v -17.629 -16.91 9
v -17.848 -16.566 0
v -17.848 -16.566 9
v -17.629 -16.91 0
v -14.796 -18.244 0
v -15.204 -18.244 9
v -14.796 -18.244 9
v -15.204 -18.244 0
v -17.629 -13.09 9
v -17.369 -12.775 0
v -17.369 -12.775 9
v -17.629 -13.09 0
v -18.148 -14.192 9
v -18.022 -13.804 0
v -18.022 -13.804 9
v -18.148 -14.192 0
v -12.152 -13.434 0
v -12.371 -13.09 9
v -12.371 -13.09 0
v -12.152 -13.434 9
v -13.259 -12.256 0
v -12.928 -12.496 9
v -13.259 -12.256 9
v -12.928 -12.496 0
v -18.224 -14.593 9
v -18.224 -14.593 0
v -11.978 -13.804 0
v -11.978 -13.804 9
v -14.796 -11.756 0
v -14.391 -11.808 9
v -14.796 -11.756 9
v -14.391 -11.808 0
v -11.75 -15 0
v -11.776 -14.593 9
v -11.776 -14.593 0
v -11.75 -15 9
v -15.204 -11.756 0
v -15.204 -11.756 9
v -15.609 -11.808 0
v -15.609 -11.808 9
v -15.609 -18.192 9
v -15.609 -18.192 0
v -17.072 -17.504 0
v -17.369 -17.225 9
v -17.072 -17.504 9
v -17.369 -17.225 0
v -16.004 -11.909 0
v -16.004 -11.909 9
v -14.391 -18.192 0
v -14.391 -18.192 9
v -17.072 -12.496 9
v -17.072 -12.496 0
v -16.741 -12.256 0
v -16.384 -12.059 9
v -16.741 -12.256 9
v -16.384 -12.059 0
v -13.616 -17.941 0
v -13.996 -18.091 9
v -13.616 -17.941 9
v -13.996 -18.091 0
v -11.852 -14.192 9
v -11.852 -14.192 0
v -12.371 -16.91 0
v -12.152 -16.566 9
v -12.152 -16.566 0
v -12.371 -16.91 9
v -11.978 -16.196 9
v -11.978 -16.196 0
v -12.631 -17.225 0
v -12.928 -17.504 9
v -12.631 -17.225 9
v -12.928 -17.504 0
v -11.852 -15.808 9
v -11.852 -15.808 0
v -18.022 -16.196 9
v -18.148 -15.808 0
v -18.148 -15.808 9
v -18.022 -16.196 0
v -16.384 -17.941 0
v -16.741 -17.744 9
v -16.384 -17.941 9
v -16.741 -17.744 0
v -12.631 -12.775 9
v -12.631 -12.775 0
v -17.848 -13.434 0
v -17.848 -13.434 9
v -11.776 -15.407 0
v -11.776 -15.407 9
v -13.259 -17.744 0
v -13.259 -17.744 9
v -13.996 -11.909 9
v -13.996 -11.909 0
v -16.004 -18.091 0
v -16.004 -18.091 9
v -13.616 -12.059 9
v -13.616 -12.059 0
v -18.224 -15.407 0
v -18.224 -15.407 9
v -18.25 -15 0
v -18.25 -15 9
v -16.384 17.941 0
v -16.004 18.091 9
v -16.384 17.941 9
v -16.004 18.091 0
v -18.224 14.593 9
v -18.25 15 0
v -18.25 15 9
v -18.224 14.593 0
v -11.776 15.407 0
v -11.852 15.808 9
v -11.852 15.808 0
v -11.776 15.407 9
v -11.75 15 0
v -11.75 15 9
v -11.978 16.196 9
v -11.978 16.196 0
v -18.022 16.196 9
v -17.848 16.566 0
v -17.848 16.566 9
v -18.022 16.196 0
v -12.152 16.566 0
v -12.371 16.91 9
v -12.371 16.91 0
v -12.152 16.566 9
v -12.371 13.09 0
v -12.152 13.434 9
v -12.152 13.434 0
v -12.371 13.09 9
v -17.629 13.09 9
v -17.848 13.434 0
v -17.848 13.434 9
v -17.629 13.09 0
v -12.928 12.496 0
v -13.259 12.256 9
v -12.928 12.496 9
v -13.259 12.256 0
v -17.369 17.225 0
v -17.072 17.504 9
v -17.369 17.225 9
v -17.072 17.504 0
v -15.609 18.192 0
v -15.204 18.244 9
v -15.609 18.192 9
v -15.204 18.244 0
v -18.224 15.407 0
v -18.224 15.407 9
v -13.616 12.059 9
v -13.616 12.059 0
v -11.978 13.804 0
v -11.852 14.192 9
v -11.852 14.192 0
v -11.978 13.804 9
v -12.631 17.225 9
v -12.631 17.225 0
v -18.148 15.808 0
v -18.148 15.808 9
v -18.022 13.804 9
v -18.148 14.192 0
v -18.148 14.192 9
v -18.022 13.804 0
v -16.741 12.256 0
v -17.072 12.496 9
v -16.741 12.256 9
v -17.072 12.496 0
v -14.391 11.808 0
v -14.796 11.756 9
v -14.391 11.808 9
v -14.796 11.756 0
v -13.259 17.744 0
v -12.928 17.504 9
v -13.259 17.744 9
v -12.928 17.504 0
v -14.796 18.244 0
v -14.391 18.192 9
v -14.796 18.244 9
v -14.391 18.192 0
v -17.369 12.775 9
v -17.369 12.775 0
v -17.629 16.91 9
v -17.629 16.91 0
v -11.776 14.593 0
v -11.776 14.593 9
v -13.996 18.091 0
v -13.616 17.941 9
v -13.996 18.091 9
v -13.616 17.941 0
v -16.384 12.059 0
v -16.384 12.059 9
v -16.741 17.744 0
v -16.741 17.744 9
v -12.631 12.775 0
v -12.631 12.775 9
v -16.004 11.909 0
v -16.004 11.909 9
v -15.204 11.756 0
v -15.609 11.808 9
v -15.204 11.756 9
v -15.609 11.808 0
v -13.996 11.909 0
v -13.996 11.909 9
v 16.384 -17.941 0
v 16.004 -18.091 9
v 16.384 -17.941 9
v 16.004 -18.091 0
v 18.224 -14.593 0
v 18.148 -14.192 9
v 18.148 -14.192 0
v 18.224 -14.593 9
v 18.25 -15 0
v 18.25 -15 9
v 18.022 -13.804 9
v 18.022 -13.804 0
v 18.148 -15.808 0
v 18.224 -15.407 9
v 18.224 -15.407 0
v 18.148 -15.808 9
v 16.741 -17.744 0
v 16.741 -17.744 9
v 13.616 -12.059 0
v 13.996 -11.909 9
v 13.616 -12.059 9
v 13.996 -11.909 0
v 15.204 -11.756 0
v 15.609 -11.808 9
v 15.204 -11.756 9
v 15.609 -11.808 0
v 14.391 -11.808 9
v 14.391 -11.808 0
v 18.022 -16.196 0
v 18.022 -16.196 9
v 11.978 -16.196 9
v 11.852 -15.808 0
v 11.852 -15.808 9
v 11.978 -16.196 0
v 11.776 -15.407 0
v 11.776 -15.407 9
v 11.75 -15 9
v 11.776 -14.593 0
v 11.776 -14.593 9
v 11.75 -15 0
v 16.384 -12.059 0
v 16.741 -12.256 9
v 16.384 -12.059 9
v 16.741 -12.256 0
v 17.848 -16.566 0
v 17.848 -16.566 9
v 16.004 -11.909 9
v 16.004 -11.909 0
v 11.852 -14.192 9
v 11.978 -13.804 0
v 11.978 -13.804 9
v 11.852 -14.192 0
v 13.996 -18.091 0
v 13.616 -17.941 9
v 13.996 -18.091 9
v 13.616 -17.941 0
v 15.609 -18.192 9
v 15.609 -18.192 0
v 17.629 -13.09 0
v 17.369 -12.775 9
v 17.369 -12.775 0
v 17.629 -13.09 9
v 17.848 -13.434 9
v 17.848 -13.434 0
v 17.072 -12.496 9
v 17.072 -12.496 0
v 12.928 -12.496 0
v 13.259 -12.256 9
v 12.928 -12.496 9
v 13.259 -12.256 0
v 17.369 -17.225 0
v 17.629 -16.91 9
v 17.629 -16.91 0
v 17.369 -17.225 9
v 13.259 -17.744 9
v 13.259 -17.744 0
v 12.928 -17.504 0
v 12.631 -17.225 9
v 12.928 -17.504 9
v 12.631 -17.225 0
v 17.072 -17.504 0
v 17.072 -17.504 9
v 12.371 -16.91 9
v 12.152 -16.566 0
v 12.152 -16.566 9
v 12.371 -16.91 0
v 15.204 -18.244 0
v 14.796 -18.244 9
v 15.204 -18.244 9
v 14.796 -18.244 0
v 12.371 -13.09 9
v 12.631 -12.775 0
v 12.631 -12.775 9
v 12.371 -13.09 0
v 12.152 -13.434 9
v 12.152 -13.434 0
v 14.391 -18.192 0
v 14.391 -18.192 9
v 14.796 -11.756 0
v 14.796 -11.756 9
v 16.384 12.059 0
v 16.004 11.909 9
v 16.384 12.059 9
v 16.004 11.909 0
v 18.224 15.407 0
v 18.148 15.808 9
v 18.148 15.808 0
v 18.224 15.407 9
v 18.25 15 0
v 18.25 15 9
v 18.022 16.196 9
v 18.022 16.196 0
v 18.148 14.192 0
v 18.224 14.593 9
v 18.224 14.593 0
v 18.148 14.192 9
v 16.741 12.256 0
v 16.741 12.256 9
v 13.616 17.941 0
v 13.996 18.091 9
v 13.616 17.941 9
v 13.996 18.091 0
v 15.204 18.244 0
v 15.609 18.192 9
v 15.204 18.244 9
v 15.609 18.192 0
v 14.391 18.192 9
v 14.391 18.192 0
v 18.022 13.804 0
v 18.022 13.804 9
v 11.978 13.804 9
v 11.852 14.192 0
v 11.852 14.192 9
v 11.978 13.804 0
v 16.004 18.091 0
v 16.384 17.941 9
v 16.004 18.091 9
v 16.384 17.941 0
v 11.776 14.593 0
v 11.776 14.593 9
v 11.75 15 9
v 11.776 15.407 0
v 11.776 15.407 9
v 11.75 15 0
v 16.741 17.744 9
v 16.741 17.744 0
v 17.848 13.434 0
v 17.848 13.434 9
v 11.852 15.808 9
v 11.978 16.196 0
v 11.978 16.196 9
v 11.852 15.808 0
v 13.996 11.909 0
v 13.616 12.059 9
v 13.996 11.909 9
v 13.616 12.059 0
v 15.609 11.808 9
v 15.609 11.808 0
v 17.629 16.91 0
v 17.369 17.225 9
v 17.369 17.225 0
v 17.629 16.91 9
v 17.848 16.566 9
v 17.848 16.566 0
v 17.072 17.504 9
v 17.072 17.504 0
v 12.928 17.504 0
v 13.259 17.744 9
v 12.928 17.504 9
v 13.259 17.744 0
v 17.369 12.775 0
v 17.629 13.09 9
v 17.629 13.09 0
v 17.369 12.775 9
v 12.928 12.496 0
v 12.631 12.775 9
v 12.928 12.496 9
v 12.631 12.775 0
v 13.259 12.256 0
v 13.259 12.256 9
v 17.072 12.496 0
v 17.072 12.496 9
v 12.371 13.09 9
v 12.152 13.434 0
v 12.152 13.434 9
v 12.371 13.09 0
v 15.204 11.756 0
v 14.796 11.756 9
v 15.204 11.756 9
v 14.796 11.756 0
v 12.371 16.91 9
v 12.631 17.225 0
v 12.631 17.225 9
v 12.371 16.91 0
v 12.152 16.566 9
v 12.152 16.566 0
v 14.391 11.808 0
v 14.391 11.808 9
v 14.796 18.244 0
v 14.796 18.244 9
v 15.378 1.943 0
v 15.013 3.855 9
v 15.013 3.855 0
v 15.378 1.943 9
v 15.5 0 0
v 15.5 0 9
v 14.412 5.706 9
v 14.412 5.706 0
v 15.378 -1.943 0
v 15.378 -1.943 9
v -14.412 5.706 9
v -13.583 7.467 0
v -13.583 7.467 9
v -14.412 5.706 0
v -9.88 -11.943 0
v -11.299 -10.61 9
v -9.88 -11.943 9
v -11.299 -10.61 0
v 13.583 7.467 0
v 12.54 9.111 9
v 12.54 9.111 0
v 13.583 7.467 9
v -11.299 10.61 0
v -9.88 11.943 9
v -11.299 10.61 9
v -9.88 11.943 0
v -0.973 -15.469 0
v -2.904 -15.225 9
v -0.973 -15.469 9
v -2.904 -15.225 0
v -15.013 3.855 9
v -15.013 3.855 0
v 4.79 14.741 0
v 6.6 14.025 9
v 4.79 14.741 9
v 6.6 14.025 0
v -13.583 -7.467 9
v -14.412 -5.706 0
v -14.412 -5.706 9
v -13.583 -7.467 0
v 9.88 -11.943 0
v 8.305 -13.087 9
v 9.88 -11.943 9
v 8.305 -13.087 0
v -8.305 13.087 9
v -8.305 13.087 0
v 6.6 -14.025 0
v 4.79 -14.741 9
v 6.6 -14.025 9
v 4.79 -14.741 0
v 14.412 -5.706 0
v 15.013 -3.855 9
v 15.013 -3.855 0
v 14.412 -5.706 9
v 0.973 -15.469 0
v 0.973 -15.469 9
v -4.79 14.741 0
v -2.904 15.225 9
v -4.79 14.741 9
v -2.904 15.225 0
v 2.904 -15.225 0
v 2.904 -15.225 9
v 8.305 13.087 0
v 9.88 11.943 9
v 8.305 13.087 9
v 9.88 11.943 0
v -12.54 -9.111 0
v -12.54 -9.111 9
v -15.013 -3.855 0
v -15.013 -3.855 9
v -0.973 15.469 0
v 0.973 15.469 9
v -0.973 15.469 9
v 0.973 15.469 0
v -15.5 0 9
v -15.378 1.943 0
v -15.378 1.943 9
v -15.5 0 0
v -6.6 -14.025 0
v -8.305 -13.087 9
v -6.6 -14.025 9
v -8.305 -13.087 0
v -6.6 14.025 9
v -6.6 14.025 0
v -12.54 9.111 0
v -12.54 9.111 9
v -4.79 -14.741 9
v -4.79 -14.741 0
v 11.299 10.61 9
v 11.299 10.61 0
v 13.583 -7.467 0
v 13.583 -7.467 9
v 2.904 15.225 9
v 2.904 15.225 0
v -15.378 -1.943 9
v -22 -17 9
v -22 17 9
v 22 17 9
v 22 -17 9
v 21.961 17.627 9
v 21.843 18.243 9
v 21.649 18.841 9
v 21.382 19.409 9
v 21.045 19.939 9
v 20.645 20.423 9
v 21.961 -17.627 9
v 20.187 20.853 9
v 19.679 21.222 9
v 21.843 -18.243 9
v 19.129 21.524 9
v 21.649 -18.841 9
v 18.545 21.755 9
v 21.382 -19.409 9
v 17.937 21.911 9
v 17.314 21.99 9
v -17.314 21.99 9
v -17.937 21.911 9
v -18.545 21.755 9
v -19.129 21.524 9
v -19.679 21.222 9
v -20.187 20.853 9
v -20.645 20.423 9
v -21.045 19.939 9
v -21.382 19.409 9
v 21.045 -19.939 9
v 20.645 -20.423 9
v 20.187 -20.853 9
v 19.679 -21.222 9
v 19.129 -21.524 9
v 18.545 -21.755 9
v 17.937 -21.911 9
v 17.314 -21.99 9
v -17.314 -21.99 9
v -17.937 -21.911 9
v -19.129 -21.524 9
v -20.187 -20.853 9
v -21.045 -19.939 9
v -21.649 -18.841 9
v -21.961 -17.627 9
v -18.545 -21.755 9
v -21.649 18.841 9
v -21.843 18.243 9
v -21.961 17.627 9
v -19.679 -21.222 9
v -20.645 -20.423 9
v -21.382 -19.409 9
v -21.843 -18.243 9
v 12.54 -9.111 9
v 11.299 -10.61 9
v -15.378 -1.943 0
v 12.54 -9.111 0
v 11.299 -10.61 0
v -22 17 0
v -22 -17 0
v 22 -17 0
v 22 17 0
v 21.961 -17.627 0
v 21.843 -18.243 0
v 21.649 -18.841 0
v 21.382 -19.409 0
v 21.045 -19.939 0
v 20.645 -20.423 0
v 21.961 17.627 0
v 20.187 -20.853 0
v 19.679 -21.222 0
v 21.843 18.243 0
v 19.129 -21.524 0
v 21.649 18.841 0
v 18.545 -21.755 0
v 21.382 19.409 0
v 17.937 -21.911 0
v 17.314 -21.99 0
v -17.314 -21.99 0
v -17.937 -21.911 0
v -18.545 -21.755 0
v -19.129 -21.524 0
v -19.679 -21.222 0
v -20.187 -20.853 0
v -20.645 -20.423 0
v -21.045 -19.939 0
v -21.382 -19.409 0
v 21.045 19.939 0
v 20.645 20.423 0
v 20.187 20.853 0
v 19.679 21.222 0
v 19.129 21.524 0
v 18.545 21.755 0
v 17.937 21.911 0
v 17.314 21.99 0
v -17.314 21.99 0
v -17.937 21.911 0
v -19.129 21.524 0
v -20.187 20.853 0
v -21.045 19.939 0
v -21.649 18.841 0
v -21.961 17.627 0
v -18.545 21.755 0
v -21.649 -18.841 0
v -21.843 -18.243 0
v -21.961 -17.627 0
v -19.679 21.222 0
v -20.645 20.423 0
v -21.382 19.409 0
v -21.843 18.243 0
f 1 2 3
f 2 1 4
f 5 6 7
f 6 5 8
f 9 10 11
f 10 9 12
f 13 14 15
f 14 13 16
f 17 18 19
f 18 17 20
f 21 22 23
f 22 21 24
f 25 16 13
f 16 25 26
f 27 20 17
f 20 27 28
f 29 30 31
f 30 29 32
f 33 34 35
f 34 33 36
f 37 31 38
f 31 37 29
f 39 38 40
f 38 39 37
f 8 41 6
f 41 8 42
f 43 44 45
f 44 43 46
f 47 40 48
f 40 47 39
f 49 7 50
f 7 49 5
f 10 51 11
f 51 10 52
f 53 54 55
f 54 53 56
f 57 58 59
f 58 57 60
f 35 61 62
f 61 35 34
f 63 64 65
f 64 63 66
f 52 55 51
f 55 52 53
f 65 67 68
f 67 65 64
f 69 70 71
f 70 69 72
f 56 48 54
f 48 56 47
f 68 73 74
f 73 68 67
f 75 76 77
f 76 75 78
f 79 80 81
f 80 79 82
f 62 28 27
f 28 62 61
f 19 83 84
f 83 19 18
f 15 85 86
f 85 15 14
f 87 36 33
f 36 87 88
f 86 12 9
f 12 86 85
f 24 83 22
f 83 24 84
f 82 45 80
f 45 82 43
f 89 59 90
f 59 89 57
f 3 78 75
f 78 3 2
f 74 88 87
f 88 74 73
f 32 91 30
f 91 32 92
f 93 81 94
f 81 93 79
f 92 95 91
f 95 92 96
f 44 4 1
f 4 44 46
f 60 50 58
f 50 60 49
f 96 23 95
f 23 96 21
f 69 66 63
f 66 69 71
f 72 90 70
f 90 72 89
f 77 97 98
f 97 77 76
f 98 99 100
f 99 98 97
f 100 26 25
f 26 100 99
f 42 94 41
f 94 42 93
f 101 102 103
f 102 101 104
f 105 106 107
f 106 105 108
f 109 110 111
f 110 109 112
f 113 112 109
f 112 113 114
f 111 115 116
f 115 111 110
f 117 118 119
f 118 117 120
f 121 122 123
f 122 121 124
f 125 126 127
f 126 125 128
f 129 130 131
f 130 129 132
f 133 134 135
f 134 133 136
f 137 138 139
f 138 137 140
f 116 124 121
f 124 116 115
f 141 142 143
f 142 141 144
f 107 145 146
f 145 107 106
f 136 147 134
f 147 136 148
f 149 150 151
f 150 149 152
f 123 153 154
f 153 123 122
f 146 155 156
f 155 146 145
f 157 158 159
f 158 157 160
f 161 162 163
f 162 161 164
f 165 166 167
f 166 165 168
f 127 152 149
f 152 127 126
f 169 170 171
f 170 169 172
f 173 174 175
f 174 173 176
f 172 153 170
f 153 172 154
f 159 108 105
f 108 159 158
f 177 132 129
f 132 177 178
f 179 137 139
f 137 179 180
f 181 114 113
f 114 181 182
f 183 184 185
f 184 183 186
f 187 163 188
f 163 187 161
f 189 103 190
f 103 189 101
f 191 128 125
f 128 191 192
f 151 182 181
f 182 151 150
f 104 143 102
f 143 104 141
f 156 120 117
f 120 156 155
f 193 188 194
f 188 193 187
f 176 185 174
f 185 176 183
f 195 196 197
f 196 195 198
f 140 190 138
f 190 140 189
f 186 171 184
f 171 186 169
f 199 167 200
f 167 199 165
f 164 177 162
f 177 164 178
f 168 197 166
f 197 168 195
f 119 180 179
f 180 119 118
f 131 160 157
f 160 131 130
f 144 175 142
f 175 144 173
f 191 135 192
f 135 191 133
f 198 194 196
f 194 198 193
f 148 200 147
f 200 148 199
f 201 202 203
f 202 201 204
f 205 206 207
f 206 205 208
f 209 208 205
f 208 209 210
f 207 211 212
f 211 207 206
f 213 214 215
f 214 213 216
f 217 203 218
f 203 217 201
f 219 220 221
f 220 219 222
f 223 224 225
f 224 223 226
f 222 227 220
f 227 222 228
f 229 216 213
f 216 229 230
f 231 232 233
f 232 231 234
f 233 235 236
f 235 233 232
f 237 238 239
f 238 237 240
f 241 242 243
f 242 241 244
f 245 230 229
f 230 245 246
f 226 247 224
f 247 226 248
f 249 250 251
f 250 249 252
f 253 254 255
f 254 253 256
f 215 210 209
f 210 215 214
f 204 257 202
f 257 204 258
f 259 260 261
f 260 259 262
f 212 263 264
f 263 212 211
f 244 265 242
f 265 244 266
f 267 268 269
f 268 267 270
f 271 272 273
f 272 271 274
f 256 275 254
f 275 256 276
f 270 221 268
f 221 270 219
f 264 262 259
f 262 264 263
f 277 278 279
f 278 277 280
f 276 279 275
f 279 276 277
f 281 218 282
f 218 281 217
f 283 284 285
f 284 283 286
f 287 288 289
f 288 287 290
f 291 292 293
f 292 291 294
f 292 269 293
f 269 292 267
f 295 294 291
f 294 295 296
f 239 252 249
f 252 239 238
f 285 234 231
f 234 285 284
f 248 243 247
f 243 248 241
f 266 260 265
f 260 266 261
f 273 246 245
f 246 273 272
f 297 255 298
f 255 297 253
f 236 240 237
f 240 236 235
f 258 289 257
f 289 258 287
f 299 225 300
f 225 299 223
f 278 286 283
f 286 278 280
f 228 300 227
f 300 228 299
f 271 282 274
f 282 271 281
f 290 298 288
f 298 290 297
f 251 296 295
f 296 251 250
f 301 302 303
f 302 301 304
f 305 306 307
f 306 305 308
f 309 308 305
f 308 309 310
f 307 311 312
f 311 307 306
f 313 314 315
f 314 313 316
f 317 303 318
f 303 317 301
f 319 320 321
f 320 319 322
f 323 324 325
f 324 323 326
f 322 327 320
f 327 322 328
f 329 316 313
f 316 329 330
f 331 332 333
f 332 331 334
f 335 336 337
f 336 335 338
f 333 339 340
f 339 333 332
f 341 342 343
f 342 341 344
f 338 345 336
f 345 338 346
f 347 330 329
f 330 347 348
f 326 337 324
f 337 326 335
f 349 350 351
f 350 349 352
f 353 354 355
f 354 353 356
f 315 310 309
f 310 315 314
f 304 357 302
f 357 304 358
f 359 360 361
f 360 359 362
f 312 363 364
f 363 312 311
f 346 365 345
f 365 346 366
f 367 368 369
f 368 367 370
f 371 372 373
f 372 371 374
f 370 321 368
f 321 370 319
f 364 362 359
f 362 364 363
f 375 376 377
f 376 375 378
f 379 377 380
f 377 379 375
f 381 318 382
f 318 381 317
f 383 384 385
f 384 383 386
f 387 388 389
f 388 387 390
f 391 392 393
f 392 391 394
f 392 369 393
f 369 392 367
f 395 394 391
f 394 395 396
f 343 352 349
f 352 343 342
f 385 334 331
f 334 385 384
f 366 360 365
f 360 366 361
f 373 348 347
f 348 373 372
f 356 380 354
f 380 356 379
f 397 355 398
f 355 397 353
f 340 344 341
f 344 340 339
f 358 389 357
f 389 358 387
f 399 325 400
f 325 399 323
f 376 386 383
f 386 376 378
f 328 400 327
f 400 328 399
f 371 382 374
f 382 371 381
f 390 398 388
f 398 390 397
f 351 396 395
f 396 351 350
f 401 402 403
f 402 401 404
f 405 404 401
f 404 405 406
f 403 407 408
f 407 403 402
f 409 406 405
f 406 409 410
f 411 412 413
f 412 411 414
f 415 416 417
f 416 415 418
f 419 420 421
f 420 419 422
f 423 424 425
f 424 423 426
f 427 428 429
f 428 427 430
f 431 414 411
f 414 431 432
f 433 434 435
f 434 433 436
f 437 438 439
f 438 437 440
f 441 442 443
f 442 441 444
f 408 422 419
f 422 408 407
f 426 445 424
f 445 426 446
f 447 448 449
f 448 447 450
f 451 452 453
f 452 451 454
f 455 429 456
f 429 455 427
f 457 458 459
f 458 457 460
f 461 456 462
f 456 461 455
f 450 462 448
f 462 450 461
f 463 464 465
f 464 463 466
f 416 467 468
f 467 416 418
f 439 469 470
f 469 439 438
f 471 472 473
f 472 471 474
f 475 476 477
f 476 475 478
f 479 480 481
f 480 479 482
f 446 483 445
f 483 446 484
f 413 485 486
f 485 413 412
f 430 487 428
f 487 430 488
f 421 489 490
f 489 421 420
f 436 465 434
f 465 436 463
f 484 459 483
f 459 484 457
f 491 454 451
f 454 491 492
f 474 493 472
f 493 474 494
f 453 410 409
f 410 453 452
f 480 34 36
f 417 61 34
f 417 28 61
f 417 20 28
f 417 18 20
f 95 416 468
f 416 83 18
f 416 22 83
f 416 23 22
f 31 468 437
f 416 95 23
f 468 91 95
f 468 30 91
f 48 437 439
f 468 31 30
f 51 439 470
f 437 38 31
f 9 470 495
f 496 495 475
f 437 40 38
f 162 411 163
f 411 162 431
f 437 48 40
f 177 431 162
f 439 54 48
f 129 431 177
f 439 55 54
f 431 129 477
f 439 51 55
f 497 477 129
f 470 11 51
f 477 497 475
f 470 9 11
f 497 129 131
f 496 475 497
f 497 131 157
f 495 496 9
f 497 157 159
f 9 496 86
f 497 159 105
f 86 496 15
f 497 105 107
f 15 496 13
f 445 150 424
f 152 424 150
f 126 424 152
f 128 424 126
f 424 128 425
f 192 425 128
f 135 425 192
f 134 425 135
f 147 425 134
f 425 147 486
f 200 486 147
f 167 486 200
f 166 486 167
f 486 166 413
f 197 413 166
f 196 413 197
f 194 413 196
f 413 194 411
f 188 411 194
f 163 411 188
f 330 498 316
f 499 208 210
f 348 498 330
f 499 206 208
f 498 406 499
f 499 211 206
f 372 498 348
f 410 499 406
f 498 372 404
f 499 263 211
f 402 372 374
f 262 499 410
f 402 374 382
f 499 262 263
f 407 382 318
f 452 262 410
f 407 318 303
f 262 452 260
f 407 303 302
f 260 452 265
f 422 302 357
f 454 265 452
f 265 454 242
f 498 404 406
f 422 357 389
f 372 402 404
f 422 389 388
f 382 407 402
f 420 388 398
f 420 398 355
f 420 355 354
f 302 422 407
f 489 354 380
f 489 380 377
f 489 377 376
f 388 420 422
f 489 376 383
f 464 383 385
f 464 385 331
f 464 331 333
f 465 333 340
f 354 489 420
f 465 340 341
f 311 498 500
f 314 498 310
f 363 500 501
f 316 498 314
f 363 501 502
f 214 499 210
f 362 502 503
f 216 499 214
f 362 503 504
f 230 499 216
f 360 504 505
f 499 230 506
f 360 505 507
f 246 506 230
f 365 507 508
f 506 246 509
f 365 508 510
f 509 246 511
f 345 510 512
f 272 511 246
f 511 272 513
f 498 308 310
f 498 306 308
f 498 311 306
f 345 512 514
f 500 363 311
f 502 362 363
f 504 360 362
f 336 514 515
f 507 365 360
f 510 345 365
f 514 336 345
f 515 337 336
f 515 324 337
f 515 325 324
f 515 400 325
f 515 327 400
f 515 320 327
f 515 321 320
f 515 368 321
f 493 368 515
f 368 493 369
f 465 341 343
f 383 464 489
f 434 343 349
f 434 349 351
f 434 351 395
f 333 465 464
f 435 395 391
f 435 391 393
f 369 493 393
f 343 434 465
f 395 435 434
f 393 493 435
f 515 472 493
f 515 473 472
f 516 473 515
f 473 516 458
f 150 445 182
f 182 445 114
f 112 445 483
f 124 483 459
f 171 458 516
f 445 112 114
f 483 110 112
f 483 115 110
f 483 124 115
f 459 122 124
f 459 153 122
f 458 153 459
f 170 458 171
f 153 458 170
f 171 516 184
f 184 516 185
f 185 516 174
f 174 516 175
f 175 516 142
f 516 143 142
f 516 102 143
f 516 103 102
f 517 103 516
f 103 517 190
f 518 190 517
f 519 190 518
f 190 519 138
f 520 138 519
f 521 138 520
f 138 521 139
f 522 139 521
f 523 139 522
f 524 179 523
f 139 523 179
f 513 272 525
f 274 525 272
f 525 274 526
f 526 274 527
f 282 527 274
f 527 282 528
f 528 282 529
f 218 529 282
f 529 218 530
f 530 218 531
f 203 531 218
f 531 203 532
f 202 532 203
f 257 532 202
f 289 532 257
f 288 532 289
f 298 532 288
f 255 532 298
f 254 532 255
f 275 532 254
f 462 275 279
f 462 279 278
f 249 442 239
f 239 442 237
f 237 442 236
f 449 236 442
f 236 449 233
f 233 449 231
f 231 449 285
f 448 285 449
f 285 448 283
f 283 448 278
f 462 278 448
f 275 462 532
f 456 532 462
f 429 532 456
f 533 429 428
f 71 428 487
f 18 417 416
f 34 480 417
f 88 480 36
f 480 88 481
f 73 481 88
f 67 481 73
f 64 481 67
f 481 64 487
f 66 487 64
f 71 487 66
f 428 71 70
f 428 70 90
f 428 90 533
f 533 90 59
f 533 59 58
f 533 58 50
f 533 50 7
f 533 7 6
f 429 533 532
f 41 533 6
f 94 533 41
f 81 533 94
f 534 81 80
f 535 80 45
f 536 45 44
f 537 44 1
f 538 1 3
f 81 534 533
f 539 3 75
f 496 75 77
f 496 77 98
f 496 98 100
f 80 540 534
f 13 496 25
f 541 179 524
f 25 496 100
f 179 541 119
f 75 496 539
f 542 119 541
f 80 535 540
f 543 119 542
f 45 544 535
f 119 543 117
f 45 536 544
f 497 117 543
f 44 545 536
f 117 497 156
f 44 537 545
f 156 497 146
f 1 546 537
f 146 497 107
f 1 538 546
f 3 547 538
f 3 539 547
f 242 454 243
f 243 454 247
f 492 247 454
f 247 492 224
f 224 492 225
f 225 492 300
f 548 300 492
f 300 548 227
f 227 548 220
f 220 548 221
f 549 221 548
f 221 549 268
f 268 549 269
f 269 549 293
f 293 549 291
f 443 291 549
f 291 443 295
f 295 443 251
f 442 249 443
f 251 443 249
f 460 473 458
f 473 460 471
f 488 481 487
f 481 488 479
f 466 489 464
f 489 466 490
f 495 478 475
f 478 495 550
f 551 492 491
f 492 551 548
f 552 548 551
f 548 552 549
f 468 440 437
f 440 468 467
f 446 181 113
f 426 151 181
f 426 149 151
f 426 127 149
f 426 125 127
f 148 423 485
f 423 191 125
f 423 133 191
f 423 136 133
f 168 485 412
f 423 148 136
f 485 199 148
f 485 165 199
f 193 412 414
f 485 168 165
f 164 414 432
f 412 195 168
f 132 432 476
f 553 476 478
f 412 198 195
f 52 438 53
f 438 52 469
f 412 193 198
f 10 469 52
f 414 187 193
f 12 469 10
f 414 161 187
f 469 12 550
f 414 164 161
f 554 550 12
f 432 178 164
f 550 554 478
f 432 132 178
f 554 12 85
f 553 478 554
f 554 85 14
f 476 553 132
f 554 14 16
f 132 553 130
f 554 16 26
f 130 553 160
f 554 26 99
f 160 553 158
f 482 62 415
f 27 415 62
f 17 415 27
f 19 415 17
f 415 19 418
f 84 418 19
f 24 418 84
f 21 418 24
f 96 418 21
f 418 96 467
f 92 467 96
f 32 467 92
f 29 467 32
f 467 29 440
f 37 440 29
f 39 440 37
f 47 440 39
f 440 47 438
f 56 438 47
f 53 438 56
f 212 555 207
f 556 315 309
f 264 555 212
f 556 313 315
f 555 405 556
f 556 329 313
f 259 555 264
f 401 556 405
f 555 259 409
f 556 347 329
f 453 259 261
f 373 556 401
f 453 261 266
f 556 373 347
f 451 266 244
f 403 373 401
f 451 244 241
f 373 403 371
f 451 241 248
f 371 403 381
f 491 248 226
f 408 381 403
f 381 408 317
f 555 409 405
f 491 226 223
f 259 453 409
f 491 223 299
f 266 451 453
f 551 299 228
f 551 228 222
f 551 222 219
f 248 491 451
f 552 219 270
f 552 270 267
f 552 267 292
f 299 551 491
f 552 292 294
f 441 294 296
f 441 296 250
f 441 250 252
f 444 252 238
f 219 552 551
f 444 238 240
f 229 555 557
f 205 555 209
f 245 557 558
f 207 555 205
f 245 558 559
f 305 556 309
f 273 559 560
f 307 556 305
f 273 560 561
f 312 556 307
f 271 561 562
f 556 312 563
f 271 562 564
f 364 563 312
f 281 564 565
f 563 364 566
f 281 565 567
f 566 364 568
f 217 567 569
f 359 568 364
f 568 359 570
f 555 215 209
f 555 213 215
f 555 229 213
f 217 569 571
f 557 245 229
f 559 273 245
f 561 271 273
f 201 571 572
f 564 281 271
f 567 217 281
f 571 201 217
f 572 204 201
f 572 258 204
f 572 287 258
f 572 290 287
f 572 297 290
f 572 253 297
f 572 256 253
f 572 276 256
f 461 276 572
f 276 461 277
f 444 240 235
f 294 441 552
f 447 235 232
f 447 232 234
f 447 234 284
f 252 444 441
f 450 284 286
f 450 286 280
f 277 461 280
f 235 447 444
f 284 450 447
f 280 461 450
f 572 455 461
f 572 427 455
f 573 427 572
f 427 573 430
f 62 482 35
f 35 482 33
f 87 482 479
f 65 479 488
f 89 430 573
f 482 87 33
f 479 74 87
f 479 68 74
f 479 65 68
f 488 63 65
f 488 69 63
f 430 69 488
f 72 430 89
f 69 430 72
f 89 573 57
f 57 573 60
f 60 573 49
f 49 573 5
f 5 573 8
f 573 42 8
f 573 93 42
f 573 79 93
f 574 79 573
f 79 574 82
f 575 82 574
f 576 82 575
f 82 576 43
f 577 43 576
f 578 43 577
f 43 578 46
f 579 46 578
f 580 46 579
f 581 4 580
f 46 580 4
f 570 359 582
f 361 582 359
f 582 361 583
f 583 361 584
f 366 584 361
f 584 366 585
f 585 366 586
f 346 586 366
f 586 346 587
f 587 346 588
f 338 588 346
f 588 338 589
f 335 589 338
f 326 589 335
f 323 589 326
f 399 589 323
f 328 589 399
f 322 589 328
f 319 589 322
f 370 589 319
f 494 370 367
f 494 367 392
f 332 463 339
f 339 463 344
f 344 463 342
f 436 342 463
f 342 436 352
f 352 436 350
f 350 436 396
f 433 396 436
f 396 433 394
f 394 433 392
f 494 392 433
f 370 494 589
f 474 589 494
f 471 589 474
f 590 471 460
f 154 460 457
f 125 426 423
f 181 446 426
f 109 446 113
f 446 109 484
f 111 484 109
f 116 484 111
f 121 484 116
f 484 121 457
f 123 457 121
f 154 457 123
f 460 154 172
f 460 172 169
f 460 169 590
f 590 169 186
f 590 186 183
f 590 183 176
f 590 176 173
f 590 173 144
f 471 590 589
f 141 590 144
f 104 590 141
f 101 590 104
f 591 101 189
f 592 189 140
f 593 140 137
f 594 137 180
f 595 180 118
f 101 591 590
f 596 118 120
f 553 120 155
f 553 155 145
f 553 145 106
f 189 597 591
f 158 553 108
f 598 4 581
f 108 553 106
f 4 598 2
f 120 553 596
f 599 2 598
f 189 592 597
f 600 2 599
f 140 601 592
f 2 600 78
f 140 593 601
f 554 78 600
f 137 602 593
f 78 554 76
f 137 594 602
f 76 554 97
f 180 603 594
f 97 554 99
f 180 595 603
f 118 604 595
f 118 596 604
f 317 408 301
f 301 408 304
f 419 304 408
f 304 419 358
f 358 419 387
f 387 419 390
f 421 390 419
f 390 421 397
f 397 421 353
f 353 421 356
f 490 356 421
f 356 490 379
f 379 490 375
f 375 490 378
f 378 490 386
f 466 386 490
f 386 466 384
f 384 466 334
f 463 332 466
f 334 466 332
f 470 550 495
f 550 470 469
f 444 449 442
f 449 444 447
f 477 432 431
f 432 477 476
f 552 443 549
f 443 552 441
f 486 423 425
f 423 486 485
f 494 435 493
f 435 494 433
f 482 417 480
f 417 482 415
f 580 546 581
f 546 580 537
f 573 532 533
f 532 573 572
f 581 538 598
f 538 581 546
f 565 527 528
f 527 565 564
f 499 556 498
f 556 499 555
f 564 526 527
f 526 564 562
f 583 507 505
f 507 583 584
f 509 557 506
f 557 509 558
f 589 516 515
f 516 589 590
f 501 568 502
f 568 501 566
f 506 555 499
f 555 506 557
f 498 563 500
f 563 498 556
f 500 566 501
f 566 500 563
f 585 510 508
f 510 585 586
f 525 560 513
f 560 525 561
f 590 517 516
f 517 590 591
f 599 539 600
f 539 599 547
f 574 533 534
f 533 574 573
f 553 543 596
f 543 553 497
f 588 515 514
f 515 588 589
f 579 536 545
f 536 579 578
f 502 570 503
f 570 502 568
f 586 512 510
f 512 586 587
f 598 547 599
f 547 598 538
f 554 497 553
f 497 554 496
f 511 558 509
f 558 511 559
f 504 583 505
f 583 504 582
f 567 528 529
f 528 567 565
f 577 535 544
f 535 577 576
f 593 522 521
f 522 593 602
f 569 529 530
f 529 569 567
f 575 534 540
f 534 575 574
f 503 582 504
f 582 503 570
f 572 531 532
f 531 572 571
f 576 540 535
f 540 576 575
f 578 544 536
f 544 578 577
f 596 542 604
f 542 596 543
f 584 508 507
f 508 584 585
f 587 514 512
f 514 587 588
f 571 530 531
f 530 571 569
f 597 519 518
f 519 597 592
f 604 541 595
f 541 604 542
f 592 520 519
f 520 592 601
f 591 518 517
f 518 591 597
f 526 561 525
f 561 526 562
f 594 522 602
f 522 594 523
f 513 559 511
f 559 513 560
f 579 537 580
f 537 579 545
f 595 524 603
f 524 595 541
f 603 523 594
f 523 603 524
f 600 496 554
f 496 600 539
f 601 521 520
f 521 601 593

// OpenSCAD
$fn = 50;


difference() {
	union() {
		hull() {
			translate(v = [-17.0000000000, 17.0000000000, 0]) {
				cylinder(h = 9, r = 5);
			}
			translate(v = [17.0000000000, 17.0000000000, 0]) {
				cylinder(h = 9, r = 5);
			}
			translate(v = [-17.0000000000, -17.0000000000, 0]) {
				cylinder(h = 9, r = 5);
			}
			translate(v = [17.0000000000, -17.0000000000, 0]) {
				cylinder(h = 9, r = 5);
			}
		}
	}
	union() {
		#translate(v = [-15.0000000000, -15.0000000000, -100.0000000000]) {
			cylinder(h = 200, r = 3.2500000000);
		}
		#translate(v = [-15.0000000000, 15.0000000000, -100.0000000000]) {
			cylinder(h = 200, r = 3.2500000000);
		}
		#translate(v = [15.0000000000, -15.0000000000, -100.0000000000]) {
			cylinder(h = 200, r = 3.2500000000);
		}
		#translate(v = [15.0000000000, 15.0000000000, -100.0000000000]) {
			cylinder(h = 200, r = 3.2500000000);
		}
		#cylinder(h = 9, r = 15.5000000000);
	}
}
